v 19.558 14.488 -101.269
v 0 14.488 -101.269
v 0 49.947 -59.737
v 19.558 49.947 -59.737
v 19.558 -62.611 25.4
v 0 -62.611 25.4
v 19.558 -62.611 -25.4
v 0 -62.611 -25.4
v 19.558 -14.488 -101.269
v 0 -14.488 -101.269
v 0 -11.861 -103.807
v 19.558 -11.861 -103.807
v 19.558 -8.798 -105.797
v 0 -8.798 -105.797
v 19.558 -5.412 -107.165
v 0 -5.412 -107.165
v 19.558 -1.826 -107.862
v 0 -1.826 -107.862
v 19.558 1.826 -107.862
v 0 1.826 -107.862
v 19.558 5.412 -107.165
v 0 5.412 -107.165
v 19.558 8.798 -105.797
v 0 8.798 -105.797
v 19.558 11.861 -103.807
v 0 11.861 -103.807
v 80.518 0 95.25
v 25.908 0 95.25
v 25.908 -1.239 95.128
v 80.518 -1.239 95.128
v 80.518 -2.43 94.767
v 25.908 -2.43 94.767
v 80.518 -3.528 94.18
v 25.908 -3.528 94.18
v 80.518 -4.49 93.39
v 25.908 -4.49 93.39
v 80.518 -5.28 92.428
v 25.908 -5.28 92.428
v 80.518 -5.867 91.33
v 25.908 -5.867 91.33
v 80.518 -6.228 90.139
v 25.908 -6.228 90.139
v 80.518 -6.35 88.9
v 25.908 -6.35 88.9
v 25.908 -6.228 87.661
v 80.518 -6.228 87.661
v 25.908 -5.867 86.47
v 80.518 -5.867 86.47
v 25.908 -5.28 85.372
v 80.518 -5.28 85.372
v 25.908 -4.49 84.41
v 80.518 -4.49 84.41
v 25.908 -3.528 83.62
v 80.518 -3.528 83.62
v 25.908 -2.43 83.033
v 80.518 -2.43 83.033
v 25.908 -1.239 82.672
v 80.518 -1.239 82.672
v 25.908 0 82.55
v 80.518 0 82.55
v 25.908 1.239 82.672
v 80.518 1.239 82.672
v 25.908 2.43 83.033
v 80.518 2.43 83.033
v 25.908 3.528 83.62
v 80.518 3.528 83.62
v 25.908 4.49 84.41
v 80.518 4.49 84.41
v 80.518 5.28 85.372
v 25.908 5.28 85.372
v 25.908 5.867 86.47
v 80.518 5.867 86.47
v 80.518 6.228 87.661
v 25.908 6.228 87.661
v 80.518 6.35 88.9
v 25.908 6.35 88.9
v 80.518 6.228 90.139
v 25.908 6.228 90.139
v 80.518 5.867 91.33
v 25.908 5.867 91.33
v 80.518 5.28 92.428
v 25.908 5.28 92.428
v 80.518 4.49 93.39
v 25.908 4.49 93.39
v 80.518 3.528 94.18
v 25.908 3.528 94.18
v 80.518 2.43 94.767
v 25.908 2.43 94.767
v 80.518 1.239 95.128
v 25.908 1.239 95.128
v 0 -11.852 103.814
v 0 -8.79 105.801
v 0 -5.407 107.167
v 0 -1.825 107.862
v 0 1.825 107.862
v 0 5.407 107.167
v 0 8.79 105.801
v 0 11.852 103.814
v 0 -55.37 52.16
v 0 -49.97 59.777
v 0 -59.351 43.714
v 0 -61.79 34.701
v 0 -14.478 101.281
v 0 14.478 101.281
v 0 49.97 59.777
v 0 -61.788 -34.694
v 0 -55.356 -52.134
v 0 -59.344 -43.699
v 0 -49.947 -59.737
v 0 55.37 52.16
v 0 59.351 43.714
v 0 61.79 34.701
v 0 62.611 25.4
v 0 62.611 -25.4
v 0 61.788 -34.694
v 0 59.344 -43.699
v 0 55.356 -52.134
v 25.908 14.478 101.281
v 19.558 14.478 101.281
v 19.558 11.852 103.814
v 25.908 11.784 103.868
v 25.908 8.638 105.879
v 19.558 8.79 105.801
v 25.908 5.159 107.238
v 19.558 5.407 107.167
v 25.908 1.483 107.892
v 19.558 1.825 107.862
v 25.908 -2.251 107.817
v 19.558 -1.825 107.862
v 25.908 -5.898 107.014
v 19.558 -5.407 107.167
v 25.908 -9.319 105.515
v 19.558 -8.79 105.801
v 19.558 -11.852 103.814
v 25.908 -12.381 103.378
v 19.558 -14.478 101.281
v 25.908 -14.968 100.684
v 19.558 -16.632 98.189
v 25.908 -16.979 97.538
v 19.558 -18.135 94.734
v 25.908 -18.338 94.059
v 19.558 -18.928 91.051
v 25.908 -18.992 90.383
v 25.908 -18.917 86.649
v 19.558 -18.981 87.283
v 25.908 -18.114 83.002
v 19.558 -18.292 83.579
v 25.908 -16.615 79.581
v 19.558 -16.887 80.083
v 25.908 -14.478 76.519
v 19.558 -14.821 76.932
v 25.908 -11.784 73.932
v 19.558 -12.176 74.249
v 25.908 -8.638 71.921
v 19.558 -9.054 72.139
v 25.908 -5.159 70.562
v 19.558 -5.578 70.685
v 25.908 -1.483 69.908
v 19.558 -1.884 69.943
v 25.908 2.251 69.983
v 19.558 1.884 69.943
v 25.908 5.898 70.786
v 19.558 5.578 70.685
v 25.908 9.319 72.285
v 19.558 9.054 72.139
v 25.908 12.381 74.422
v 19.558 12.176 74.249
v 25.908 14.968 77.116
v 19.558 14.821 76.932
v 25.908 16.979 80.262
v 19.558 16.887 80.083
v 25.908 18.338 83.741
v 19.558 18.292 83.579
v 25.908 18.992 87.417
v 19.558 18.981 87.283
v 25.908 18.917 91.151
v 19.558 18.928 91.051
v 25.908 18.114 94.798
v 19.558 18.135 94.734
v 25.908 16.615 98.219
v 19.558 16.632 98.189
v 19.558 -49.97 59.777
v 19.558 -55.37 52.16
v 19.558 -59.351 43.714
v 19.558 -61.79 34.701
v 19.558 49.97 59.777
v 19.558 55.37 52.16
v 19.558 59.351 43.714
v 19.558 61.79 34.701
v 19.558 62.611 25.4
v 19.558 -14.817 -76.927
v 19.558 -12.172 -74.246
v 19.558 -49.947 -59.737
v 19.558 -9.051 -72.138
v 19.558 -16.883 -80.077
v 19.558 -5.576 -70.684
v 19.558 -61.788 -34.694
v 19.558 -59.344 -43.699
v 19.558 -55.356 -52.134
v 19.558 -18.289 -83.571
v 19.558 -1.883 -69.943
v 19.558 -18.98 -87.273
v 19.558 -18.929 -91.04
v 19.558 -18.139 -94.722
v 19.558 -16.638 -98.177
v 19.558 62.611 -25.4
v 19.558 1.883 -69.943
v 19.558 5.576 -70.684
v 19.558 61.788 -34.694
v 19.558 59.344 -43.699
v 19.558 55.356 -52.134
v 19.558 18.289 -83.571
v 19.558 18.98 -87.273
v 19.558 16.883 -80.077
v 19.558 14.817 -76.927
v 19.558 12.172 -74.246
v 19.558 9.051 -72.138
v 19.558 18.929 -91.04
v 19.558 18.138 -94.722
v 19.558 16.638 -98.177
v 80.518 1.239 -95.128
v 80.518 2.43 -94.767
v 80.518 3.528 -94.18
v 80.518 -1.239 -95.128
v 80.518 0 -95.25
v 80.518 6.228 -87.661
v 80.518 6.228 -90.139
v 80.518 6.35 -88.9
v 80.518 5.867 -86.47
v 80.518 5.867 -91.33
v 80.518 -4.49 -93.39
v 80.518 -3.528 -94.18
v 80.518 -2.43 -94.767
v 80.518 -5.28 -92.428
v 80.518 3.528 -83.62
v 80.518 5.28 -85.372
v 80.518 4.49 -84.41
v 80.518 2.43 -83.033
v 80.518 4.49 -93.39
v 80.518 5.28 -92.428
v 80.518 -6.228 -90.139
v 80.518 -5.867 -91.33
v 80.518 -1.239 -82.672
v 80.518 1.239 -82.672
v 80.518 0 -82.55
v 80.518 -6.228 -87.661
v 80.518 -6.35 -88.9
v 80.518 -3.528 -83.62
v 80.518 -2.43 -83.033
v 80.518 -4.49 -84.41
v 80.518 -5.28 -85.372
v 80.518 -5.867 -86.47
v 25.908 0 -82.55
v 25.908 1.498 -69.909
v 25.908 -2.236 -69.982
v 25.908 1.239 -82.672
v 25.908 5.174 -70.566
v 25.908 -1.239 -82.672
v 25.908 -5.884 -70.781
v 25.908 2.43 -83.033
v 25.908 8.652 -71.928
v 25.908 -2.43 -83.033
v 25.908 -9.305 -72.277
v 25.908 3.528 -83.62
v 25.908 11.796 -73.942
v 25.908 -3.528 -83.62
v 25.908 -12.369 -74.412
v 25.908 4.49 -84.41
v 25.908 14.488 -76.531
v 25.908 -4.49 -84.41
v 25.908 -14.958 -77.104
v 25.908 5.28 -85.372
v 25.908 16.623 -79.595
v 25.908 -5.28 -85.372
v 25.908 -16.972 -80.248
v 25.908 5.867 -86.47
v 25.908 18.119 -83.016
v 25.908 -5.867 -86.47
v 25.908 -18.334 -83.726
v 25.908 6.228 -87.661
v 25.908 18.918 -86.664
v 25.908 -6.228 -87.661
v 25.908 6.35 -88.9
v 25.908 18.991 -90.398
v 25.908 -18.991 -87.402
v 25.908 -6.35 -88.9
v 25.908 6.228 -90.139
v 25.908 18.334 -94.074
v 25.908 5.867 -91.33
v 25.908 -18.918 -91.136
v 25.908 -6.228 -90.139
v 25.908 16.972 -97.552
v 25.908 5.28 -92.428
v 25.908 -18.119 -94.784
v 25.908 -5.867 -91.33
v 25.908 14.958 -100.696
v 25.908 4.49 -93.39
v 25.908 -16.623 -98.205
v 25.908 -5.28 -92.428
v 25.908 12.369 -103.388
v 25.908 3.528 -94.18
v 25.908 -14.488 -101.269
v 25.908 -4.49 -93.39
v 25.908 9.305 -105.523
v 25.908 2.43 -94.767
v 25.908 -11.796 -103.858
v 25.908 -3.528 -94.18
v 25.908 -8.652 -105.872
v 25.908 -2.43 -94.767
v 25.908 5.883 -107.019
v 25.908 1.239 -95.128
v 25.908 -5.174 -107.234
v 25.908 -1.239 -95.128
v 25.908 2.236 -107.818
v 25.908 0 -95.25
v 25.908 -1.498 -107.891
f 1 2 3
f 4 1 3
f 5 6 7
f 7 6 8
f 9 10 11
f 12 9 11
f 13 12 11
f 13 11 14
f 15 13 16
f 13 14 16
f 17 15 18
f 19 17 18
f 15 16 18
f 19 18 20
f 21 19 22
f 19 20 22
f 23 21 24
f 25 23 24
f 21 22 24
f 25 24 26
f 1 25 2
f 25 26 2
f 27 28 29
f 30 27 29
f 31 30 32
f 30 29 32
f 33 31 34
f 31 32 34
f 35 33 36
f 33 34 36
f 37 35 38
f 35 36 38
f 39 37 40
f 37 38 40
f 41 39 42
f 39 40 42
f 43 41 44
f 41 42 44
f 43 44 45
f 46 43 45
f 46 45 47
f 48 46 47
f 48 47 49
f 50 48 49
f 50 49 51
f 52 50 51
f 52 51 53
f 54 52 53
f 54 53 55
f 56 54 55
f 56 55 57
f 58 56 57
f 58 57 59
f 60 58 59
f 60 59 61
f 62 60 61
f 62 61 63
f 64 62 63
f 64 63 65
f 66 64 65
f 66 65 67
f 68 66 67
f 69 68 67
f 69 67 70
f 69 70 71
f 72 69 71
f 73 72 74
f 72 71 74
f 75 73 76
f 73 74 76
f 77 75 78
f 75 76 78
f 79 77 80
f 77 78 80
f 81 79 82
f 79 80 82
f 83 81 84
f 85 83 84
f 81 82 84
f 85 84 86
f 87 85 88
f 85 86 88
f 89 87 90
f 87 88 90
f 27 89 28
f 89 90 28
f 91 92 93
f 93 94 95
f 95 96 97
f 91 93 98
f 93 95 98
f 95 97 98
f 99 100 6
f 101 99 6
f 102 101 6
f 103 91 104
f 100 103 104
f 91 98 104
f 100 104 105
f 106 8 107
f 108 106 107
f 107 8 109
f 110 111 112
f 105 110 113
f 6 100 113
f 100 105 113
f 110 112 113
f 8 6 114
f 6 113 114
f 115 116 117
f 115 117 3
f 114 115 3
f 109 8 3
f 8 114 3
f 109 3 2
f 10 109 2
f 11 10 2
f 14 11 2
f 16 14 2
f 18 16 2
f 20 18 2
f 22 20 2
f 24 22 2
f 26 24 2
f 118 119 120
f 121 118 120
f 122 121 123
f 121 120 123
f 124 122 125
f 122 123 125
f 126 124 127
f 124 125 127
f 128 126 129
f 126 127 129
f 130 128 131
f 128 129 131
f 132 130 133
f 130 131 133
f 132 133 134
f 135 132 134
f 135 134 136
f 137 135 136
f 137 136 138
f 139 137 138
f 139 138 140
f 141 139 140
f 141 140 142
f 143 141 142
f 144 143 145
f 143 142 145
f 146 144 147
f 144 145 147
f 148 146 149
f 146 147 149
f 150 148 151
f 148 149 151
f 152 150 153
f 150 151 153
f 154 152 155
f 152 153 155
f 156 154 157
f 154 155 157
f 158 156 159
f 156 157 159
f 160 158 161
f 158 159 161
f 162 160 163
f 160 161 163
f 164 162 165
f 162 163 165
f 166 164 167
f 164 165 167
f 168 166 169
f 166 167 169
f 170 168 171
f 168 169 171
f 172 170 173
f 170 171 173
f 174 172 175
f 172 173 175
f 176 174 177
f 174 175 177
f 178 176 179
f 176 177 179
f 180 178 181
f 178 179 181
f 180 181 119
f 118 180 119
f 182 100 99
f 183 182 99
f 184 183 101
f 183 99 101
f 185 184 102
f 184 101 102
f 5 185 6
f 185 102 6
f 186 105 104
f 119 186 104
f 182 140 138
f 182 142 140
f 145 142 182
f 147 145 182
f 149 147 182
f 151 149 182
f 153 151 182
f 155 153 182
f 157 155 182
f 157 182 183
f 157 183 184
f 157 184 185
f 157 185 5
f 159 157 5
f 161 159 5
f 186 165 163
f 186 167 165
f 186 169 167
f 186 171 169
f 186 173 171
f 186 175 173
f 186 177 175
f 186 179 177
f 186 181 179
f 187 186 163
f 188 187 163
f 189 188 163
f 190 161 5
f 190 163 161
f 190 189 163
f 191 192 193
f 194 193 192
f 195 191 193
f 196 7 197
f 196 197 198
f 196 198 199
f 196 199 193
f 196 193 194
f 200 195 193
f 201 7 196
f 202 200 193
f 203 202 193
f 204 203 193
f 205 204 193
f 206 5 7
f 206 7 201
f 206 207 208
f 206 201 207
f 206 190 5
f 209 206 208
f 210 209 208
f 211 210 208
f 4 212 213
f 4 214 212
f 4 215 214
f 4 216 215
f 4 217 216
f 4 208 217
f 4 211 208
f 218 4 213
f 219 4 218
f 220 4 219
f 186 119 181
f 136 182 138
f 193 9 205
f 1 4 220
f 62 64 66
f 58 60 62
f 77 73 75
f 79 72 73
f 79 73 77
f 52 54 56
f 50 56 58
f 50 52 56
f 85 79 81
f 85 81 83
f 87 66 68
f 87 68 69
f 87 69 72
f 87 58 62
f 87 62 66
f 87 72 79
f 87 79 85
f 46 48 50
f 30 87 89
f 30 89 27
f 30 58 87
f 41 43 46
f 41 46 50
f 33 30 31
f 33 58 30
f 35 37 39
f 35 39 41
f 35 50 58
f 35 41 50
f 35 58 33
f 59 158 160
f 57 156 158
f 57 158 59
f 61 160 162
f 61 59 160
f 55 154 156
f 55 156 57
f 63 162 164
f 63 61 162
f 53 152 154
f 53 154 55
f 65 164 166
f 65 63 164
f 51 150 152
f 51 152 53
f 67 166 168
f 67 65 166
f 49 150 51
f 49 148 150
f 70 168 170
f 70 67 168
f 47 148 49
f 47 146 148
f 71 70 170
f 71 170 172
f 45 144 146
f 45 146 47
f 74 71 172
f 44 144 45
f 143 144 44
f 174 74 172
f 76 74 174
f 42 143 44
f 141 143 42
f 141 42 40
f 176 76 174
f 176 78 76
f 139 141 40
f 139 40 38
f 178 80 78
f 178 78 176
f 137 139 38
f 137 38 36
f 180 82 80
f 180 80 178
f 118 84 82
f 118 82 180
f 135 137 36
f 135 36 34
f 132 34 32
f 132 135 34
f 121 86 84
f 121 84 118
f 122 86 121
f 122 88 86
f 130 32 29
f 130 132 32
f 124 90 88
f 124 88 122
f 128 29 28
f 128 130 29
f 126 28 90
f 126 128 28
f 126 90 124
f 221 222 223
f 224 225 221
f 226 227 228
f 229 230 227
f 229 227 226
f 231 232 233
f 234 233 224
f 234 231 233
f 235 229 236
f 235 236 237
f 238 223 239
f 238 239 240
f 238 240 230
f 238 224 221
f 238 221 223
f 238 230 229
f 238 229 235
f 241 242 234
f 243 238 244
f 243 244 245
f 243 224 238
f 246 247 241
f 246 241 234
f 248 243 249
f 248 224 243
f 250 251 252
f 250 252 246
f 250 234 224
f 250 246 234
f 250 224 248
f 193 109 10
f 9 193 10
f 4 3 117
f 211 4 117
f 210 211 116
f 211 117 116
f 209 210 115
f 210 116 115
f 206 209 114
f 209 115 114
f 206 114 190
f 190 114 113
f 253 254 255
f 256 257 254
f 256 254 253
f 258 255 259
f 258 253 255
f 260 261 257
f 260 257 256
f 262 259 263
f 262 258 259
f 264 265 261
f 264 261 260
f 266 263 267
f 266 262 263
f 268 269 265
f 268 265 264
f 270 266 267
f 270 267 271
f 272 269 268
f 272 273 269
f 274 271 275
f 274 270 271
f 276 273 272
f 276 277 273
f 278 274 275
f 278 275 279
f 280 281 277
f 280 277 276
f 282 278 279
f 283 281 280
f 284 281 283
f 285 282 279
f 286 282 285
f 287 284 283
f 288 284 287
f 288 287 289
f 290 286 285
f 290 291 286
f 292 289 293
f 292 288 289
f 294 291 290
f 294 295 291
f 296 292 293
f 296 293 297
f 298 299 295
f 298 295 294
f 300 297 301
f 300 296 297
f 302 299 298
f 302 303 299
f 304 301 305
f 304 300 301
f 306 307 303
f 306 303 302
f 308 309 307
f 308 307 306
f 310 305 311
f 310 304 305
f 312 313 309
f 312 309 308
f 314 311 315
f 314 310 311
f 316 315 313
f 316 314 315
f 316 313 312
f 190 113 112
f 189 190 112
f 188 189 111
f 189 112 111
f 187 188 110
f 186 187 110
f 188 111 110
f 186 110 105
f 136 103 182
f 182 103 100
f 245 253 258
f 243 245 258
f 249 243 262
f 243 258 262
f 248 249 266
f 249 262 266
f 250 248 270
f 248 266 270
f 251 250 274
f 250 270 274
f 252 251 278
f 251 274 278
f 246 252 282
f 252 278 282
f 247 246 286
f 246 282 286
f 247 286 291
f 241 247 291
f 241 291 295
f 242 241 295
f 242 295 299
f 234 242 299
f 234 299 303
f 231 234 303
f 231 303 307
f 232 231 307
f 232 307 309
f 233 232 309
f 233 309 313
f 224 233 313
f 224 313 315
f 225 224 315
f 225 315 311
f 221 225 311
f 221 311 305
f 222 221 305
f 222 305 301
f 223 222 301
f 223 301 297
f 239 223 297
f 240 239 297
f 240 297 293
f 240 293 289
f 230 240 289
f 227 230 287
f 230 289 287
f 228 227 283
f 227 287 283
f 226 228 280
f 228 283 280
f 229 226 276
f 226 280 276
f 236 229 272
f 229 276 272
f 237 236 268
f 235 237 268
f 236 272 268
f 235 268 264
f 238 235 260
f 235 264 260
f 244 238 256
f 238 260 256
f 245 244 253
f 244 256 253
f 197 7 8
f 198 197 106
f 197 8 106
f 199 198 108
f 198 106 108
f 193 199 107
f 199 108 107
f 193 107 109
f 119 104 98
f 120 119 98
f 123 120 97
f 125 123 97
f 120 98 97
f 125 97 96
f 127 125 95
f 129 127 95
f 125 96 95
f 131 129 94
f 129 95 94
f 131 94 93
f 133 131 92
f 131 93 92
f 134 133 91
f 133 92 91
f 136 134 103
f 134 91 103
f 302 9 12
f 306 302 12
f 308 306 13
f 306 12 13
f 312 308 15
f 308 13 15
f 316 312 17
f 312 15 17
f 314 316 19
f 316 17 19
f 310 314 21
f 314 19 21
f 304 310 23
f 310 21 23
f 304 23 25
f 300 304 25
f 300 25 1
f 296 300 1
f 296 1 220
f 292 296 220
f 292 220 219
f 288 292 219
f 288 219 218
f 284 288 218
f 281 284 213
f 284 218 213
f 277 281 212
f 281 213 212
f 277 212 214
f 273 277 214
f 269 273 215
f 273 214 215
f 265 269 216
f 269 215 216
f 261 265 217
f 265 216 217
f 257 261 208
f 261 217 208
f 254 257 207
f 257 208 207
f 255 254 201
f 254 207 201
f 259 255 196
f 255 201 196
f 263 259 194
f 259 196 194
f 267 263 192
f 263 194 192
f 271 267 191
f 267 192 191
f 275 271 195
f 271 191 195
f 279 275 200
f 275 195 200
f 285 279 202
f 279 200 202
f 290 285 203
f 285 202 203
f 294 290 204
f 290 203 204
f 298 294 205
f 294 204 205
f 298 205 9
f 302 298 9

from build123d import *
from build123d.topology import SkipClean

# Parameters (mm, degrees)
SKETCH1_R           = 19.05
BOSS_EXTRUDE1_DEPTH = 19.558
SKETCH2_R           = 6.35
BOSS_EXTRUDE2_DEPTH = 60.96
SKETCH3_R           = 19.05
BOSS_EXTRUDE3_DEPTH = 6.35


with BuildPart() as part:
    # Sketch1 → Boss-Extrude1 (new body)
    with BuildSketch(Plane(origin=(0, 0, 0), x_dir=(0, 0, -1), z_dir=(1, 0, 0))):
        with BuildLine():
            Line((25.4, 62.611), (-25.4, 62.611))
            ThreePointArc((-25.4, 62.611), (-43.71389723, 59.350669702), (-59.777434529, 49.970298982))
            Line((-59.777434529, 49.970298982), (-101.281034529, 14.478))
            ThreePointArc((-101.281034529, 14.478), (-80.929937509, 17.302618411), (-69.85, 0))
            ThreePointArc((-69.85, 0), (-80.929937509, -17.302618411), (-101.281034529, -14.478))
            Line((-101.281034529, -14.478), (-59.777434529, -49.970298982))
            ThreePointArc((-59.777434529, -49.970298982), (-43.71389723, -59.350669702), (-25.4, -62.611))
            Line((-25.4, -62.611), (25.4, -62.611))
            ThreePointArc((25.4, -62.611), (43.699078076, -59.34404997), (59.737214243, -49.946847768))
            Line((59.737214243, -49.946847768), (101.269374674, -14.487973703))
            ThreePointArc((101.269374674, -14.487973703), (69.85, -7.706e-06), (101.269379322, 14.48794821))
            Line((101.269379322, 14.48794821), (59.737230268, 49.9468356))
            ThreePointArc((59.737230268, 49.9468356), (43.699087699, 59.344046737), (25.4, 62.611))
        make_face()
        with Locations((88.9, -1.0762e-05)):
            Circle(SKETCH1_R)
        with Locations((-88.9, 0)):
            Circle(SKETCH1_R)
    extrude(amount=BOSS_EXTRUDE1_DEPTH)

    # Sketch2 → Boss-Extrude2 (add)
    with BuildSketch(Plane(origin=(19.558, 0, 0), x_dir=(0, 0, -1), z_dir=(1, 0, 0))):
        with Locations(Location((-88.9, 0, 0), (0, 0, 180))):
            Circle(SKETCH2_R)
        with Locations(Location((88.9, -1.0762e-05, 0), (0, 0, 180))):
            Circle(SKETCH2_R)
    extrude(amount=BOSS_EXTRUDE2_DEPTH)

    # Sketch3 → Boss-Extrude3 (add)
    with SkipClean():  # the faces are left unmerged after this step: merging them gives an invalid solid
        with BuildSketch(Plane(origin=(19.558, 0, 0), x_dir=(0, 0, -1), z_dir=(1, 0, 0))):
            with Locations(Location((-88.9, 0, 0), (0, 0, 130.535802111))):
                Circle(SKETCH3_R)
            with Locations(Location((88.9, -1.0762e-05, 0), (0, 0, 310.489674839))):
                Circle(SKETCH3_R)
        extrude(amount=BOSS_EXTRUDE3_DEPTH)


solid = part.part
